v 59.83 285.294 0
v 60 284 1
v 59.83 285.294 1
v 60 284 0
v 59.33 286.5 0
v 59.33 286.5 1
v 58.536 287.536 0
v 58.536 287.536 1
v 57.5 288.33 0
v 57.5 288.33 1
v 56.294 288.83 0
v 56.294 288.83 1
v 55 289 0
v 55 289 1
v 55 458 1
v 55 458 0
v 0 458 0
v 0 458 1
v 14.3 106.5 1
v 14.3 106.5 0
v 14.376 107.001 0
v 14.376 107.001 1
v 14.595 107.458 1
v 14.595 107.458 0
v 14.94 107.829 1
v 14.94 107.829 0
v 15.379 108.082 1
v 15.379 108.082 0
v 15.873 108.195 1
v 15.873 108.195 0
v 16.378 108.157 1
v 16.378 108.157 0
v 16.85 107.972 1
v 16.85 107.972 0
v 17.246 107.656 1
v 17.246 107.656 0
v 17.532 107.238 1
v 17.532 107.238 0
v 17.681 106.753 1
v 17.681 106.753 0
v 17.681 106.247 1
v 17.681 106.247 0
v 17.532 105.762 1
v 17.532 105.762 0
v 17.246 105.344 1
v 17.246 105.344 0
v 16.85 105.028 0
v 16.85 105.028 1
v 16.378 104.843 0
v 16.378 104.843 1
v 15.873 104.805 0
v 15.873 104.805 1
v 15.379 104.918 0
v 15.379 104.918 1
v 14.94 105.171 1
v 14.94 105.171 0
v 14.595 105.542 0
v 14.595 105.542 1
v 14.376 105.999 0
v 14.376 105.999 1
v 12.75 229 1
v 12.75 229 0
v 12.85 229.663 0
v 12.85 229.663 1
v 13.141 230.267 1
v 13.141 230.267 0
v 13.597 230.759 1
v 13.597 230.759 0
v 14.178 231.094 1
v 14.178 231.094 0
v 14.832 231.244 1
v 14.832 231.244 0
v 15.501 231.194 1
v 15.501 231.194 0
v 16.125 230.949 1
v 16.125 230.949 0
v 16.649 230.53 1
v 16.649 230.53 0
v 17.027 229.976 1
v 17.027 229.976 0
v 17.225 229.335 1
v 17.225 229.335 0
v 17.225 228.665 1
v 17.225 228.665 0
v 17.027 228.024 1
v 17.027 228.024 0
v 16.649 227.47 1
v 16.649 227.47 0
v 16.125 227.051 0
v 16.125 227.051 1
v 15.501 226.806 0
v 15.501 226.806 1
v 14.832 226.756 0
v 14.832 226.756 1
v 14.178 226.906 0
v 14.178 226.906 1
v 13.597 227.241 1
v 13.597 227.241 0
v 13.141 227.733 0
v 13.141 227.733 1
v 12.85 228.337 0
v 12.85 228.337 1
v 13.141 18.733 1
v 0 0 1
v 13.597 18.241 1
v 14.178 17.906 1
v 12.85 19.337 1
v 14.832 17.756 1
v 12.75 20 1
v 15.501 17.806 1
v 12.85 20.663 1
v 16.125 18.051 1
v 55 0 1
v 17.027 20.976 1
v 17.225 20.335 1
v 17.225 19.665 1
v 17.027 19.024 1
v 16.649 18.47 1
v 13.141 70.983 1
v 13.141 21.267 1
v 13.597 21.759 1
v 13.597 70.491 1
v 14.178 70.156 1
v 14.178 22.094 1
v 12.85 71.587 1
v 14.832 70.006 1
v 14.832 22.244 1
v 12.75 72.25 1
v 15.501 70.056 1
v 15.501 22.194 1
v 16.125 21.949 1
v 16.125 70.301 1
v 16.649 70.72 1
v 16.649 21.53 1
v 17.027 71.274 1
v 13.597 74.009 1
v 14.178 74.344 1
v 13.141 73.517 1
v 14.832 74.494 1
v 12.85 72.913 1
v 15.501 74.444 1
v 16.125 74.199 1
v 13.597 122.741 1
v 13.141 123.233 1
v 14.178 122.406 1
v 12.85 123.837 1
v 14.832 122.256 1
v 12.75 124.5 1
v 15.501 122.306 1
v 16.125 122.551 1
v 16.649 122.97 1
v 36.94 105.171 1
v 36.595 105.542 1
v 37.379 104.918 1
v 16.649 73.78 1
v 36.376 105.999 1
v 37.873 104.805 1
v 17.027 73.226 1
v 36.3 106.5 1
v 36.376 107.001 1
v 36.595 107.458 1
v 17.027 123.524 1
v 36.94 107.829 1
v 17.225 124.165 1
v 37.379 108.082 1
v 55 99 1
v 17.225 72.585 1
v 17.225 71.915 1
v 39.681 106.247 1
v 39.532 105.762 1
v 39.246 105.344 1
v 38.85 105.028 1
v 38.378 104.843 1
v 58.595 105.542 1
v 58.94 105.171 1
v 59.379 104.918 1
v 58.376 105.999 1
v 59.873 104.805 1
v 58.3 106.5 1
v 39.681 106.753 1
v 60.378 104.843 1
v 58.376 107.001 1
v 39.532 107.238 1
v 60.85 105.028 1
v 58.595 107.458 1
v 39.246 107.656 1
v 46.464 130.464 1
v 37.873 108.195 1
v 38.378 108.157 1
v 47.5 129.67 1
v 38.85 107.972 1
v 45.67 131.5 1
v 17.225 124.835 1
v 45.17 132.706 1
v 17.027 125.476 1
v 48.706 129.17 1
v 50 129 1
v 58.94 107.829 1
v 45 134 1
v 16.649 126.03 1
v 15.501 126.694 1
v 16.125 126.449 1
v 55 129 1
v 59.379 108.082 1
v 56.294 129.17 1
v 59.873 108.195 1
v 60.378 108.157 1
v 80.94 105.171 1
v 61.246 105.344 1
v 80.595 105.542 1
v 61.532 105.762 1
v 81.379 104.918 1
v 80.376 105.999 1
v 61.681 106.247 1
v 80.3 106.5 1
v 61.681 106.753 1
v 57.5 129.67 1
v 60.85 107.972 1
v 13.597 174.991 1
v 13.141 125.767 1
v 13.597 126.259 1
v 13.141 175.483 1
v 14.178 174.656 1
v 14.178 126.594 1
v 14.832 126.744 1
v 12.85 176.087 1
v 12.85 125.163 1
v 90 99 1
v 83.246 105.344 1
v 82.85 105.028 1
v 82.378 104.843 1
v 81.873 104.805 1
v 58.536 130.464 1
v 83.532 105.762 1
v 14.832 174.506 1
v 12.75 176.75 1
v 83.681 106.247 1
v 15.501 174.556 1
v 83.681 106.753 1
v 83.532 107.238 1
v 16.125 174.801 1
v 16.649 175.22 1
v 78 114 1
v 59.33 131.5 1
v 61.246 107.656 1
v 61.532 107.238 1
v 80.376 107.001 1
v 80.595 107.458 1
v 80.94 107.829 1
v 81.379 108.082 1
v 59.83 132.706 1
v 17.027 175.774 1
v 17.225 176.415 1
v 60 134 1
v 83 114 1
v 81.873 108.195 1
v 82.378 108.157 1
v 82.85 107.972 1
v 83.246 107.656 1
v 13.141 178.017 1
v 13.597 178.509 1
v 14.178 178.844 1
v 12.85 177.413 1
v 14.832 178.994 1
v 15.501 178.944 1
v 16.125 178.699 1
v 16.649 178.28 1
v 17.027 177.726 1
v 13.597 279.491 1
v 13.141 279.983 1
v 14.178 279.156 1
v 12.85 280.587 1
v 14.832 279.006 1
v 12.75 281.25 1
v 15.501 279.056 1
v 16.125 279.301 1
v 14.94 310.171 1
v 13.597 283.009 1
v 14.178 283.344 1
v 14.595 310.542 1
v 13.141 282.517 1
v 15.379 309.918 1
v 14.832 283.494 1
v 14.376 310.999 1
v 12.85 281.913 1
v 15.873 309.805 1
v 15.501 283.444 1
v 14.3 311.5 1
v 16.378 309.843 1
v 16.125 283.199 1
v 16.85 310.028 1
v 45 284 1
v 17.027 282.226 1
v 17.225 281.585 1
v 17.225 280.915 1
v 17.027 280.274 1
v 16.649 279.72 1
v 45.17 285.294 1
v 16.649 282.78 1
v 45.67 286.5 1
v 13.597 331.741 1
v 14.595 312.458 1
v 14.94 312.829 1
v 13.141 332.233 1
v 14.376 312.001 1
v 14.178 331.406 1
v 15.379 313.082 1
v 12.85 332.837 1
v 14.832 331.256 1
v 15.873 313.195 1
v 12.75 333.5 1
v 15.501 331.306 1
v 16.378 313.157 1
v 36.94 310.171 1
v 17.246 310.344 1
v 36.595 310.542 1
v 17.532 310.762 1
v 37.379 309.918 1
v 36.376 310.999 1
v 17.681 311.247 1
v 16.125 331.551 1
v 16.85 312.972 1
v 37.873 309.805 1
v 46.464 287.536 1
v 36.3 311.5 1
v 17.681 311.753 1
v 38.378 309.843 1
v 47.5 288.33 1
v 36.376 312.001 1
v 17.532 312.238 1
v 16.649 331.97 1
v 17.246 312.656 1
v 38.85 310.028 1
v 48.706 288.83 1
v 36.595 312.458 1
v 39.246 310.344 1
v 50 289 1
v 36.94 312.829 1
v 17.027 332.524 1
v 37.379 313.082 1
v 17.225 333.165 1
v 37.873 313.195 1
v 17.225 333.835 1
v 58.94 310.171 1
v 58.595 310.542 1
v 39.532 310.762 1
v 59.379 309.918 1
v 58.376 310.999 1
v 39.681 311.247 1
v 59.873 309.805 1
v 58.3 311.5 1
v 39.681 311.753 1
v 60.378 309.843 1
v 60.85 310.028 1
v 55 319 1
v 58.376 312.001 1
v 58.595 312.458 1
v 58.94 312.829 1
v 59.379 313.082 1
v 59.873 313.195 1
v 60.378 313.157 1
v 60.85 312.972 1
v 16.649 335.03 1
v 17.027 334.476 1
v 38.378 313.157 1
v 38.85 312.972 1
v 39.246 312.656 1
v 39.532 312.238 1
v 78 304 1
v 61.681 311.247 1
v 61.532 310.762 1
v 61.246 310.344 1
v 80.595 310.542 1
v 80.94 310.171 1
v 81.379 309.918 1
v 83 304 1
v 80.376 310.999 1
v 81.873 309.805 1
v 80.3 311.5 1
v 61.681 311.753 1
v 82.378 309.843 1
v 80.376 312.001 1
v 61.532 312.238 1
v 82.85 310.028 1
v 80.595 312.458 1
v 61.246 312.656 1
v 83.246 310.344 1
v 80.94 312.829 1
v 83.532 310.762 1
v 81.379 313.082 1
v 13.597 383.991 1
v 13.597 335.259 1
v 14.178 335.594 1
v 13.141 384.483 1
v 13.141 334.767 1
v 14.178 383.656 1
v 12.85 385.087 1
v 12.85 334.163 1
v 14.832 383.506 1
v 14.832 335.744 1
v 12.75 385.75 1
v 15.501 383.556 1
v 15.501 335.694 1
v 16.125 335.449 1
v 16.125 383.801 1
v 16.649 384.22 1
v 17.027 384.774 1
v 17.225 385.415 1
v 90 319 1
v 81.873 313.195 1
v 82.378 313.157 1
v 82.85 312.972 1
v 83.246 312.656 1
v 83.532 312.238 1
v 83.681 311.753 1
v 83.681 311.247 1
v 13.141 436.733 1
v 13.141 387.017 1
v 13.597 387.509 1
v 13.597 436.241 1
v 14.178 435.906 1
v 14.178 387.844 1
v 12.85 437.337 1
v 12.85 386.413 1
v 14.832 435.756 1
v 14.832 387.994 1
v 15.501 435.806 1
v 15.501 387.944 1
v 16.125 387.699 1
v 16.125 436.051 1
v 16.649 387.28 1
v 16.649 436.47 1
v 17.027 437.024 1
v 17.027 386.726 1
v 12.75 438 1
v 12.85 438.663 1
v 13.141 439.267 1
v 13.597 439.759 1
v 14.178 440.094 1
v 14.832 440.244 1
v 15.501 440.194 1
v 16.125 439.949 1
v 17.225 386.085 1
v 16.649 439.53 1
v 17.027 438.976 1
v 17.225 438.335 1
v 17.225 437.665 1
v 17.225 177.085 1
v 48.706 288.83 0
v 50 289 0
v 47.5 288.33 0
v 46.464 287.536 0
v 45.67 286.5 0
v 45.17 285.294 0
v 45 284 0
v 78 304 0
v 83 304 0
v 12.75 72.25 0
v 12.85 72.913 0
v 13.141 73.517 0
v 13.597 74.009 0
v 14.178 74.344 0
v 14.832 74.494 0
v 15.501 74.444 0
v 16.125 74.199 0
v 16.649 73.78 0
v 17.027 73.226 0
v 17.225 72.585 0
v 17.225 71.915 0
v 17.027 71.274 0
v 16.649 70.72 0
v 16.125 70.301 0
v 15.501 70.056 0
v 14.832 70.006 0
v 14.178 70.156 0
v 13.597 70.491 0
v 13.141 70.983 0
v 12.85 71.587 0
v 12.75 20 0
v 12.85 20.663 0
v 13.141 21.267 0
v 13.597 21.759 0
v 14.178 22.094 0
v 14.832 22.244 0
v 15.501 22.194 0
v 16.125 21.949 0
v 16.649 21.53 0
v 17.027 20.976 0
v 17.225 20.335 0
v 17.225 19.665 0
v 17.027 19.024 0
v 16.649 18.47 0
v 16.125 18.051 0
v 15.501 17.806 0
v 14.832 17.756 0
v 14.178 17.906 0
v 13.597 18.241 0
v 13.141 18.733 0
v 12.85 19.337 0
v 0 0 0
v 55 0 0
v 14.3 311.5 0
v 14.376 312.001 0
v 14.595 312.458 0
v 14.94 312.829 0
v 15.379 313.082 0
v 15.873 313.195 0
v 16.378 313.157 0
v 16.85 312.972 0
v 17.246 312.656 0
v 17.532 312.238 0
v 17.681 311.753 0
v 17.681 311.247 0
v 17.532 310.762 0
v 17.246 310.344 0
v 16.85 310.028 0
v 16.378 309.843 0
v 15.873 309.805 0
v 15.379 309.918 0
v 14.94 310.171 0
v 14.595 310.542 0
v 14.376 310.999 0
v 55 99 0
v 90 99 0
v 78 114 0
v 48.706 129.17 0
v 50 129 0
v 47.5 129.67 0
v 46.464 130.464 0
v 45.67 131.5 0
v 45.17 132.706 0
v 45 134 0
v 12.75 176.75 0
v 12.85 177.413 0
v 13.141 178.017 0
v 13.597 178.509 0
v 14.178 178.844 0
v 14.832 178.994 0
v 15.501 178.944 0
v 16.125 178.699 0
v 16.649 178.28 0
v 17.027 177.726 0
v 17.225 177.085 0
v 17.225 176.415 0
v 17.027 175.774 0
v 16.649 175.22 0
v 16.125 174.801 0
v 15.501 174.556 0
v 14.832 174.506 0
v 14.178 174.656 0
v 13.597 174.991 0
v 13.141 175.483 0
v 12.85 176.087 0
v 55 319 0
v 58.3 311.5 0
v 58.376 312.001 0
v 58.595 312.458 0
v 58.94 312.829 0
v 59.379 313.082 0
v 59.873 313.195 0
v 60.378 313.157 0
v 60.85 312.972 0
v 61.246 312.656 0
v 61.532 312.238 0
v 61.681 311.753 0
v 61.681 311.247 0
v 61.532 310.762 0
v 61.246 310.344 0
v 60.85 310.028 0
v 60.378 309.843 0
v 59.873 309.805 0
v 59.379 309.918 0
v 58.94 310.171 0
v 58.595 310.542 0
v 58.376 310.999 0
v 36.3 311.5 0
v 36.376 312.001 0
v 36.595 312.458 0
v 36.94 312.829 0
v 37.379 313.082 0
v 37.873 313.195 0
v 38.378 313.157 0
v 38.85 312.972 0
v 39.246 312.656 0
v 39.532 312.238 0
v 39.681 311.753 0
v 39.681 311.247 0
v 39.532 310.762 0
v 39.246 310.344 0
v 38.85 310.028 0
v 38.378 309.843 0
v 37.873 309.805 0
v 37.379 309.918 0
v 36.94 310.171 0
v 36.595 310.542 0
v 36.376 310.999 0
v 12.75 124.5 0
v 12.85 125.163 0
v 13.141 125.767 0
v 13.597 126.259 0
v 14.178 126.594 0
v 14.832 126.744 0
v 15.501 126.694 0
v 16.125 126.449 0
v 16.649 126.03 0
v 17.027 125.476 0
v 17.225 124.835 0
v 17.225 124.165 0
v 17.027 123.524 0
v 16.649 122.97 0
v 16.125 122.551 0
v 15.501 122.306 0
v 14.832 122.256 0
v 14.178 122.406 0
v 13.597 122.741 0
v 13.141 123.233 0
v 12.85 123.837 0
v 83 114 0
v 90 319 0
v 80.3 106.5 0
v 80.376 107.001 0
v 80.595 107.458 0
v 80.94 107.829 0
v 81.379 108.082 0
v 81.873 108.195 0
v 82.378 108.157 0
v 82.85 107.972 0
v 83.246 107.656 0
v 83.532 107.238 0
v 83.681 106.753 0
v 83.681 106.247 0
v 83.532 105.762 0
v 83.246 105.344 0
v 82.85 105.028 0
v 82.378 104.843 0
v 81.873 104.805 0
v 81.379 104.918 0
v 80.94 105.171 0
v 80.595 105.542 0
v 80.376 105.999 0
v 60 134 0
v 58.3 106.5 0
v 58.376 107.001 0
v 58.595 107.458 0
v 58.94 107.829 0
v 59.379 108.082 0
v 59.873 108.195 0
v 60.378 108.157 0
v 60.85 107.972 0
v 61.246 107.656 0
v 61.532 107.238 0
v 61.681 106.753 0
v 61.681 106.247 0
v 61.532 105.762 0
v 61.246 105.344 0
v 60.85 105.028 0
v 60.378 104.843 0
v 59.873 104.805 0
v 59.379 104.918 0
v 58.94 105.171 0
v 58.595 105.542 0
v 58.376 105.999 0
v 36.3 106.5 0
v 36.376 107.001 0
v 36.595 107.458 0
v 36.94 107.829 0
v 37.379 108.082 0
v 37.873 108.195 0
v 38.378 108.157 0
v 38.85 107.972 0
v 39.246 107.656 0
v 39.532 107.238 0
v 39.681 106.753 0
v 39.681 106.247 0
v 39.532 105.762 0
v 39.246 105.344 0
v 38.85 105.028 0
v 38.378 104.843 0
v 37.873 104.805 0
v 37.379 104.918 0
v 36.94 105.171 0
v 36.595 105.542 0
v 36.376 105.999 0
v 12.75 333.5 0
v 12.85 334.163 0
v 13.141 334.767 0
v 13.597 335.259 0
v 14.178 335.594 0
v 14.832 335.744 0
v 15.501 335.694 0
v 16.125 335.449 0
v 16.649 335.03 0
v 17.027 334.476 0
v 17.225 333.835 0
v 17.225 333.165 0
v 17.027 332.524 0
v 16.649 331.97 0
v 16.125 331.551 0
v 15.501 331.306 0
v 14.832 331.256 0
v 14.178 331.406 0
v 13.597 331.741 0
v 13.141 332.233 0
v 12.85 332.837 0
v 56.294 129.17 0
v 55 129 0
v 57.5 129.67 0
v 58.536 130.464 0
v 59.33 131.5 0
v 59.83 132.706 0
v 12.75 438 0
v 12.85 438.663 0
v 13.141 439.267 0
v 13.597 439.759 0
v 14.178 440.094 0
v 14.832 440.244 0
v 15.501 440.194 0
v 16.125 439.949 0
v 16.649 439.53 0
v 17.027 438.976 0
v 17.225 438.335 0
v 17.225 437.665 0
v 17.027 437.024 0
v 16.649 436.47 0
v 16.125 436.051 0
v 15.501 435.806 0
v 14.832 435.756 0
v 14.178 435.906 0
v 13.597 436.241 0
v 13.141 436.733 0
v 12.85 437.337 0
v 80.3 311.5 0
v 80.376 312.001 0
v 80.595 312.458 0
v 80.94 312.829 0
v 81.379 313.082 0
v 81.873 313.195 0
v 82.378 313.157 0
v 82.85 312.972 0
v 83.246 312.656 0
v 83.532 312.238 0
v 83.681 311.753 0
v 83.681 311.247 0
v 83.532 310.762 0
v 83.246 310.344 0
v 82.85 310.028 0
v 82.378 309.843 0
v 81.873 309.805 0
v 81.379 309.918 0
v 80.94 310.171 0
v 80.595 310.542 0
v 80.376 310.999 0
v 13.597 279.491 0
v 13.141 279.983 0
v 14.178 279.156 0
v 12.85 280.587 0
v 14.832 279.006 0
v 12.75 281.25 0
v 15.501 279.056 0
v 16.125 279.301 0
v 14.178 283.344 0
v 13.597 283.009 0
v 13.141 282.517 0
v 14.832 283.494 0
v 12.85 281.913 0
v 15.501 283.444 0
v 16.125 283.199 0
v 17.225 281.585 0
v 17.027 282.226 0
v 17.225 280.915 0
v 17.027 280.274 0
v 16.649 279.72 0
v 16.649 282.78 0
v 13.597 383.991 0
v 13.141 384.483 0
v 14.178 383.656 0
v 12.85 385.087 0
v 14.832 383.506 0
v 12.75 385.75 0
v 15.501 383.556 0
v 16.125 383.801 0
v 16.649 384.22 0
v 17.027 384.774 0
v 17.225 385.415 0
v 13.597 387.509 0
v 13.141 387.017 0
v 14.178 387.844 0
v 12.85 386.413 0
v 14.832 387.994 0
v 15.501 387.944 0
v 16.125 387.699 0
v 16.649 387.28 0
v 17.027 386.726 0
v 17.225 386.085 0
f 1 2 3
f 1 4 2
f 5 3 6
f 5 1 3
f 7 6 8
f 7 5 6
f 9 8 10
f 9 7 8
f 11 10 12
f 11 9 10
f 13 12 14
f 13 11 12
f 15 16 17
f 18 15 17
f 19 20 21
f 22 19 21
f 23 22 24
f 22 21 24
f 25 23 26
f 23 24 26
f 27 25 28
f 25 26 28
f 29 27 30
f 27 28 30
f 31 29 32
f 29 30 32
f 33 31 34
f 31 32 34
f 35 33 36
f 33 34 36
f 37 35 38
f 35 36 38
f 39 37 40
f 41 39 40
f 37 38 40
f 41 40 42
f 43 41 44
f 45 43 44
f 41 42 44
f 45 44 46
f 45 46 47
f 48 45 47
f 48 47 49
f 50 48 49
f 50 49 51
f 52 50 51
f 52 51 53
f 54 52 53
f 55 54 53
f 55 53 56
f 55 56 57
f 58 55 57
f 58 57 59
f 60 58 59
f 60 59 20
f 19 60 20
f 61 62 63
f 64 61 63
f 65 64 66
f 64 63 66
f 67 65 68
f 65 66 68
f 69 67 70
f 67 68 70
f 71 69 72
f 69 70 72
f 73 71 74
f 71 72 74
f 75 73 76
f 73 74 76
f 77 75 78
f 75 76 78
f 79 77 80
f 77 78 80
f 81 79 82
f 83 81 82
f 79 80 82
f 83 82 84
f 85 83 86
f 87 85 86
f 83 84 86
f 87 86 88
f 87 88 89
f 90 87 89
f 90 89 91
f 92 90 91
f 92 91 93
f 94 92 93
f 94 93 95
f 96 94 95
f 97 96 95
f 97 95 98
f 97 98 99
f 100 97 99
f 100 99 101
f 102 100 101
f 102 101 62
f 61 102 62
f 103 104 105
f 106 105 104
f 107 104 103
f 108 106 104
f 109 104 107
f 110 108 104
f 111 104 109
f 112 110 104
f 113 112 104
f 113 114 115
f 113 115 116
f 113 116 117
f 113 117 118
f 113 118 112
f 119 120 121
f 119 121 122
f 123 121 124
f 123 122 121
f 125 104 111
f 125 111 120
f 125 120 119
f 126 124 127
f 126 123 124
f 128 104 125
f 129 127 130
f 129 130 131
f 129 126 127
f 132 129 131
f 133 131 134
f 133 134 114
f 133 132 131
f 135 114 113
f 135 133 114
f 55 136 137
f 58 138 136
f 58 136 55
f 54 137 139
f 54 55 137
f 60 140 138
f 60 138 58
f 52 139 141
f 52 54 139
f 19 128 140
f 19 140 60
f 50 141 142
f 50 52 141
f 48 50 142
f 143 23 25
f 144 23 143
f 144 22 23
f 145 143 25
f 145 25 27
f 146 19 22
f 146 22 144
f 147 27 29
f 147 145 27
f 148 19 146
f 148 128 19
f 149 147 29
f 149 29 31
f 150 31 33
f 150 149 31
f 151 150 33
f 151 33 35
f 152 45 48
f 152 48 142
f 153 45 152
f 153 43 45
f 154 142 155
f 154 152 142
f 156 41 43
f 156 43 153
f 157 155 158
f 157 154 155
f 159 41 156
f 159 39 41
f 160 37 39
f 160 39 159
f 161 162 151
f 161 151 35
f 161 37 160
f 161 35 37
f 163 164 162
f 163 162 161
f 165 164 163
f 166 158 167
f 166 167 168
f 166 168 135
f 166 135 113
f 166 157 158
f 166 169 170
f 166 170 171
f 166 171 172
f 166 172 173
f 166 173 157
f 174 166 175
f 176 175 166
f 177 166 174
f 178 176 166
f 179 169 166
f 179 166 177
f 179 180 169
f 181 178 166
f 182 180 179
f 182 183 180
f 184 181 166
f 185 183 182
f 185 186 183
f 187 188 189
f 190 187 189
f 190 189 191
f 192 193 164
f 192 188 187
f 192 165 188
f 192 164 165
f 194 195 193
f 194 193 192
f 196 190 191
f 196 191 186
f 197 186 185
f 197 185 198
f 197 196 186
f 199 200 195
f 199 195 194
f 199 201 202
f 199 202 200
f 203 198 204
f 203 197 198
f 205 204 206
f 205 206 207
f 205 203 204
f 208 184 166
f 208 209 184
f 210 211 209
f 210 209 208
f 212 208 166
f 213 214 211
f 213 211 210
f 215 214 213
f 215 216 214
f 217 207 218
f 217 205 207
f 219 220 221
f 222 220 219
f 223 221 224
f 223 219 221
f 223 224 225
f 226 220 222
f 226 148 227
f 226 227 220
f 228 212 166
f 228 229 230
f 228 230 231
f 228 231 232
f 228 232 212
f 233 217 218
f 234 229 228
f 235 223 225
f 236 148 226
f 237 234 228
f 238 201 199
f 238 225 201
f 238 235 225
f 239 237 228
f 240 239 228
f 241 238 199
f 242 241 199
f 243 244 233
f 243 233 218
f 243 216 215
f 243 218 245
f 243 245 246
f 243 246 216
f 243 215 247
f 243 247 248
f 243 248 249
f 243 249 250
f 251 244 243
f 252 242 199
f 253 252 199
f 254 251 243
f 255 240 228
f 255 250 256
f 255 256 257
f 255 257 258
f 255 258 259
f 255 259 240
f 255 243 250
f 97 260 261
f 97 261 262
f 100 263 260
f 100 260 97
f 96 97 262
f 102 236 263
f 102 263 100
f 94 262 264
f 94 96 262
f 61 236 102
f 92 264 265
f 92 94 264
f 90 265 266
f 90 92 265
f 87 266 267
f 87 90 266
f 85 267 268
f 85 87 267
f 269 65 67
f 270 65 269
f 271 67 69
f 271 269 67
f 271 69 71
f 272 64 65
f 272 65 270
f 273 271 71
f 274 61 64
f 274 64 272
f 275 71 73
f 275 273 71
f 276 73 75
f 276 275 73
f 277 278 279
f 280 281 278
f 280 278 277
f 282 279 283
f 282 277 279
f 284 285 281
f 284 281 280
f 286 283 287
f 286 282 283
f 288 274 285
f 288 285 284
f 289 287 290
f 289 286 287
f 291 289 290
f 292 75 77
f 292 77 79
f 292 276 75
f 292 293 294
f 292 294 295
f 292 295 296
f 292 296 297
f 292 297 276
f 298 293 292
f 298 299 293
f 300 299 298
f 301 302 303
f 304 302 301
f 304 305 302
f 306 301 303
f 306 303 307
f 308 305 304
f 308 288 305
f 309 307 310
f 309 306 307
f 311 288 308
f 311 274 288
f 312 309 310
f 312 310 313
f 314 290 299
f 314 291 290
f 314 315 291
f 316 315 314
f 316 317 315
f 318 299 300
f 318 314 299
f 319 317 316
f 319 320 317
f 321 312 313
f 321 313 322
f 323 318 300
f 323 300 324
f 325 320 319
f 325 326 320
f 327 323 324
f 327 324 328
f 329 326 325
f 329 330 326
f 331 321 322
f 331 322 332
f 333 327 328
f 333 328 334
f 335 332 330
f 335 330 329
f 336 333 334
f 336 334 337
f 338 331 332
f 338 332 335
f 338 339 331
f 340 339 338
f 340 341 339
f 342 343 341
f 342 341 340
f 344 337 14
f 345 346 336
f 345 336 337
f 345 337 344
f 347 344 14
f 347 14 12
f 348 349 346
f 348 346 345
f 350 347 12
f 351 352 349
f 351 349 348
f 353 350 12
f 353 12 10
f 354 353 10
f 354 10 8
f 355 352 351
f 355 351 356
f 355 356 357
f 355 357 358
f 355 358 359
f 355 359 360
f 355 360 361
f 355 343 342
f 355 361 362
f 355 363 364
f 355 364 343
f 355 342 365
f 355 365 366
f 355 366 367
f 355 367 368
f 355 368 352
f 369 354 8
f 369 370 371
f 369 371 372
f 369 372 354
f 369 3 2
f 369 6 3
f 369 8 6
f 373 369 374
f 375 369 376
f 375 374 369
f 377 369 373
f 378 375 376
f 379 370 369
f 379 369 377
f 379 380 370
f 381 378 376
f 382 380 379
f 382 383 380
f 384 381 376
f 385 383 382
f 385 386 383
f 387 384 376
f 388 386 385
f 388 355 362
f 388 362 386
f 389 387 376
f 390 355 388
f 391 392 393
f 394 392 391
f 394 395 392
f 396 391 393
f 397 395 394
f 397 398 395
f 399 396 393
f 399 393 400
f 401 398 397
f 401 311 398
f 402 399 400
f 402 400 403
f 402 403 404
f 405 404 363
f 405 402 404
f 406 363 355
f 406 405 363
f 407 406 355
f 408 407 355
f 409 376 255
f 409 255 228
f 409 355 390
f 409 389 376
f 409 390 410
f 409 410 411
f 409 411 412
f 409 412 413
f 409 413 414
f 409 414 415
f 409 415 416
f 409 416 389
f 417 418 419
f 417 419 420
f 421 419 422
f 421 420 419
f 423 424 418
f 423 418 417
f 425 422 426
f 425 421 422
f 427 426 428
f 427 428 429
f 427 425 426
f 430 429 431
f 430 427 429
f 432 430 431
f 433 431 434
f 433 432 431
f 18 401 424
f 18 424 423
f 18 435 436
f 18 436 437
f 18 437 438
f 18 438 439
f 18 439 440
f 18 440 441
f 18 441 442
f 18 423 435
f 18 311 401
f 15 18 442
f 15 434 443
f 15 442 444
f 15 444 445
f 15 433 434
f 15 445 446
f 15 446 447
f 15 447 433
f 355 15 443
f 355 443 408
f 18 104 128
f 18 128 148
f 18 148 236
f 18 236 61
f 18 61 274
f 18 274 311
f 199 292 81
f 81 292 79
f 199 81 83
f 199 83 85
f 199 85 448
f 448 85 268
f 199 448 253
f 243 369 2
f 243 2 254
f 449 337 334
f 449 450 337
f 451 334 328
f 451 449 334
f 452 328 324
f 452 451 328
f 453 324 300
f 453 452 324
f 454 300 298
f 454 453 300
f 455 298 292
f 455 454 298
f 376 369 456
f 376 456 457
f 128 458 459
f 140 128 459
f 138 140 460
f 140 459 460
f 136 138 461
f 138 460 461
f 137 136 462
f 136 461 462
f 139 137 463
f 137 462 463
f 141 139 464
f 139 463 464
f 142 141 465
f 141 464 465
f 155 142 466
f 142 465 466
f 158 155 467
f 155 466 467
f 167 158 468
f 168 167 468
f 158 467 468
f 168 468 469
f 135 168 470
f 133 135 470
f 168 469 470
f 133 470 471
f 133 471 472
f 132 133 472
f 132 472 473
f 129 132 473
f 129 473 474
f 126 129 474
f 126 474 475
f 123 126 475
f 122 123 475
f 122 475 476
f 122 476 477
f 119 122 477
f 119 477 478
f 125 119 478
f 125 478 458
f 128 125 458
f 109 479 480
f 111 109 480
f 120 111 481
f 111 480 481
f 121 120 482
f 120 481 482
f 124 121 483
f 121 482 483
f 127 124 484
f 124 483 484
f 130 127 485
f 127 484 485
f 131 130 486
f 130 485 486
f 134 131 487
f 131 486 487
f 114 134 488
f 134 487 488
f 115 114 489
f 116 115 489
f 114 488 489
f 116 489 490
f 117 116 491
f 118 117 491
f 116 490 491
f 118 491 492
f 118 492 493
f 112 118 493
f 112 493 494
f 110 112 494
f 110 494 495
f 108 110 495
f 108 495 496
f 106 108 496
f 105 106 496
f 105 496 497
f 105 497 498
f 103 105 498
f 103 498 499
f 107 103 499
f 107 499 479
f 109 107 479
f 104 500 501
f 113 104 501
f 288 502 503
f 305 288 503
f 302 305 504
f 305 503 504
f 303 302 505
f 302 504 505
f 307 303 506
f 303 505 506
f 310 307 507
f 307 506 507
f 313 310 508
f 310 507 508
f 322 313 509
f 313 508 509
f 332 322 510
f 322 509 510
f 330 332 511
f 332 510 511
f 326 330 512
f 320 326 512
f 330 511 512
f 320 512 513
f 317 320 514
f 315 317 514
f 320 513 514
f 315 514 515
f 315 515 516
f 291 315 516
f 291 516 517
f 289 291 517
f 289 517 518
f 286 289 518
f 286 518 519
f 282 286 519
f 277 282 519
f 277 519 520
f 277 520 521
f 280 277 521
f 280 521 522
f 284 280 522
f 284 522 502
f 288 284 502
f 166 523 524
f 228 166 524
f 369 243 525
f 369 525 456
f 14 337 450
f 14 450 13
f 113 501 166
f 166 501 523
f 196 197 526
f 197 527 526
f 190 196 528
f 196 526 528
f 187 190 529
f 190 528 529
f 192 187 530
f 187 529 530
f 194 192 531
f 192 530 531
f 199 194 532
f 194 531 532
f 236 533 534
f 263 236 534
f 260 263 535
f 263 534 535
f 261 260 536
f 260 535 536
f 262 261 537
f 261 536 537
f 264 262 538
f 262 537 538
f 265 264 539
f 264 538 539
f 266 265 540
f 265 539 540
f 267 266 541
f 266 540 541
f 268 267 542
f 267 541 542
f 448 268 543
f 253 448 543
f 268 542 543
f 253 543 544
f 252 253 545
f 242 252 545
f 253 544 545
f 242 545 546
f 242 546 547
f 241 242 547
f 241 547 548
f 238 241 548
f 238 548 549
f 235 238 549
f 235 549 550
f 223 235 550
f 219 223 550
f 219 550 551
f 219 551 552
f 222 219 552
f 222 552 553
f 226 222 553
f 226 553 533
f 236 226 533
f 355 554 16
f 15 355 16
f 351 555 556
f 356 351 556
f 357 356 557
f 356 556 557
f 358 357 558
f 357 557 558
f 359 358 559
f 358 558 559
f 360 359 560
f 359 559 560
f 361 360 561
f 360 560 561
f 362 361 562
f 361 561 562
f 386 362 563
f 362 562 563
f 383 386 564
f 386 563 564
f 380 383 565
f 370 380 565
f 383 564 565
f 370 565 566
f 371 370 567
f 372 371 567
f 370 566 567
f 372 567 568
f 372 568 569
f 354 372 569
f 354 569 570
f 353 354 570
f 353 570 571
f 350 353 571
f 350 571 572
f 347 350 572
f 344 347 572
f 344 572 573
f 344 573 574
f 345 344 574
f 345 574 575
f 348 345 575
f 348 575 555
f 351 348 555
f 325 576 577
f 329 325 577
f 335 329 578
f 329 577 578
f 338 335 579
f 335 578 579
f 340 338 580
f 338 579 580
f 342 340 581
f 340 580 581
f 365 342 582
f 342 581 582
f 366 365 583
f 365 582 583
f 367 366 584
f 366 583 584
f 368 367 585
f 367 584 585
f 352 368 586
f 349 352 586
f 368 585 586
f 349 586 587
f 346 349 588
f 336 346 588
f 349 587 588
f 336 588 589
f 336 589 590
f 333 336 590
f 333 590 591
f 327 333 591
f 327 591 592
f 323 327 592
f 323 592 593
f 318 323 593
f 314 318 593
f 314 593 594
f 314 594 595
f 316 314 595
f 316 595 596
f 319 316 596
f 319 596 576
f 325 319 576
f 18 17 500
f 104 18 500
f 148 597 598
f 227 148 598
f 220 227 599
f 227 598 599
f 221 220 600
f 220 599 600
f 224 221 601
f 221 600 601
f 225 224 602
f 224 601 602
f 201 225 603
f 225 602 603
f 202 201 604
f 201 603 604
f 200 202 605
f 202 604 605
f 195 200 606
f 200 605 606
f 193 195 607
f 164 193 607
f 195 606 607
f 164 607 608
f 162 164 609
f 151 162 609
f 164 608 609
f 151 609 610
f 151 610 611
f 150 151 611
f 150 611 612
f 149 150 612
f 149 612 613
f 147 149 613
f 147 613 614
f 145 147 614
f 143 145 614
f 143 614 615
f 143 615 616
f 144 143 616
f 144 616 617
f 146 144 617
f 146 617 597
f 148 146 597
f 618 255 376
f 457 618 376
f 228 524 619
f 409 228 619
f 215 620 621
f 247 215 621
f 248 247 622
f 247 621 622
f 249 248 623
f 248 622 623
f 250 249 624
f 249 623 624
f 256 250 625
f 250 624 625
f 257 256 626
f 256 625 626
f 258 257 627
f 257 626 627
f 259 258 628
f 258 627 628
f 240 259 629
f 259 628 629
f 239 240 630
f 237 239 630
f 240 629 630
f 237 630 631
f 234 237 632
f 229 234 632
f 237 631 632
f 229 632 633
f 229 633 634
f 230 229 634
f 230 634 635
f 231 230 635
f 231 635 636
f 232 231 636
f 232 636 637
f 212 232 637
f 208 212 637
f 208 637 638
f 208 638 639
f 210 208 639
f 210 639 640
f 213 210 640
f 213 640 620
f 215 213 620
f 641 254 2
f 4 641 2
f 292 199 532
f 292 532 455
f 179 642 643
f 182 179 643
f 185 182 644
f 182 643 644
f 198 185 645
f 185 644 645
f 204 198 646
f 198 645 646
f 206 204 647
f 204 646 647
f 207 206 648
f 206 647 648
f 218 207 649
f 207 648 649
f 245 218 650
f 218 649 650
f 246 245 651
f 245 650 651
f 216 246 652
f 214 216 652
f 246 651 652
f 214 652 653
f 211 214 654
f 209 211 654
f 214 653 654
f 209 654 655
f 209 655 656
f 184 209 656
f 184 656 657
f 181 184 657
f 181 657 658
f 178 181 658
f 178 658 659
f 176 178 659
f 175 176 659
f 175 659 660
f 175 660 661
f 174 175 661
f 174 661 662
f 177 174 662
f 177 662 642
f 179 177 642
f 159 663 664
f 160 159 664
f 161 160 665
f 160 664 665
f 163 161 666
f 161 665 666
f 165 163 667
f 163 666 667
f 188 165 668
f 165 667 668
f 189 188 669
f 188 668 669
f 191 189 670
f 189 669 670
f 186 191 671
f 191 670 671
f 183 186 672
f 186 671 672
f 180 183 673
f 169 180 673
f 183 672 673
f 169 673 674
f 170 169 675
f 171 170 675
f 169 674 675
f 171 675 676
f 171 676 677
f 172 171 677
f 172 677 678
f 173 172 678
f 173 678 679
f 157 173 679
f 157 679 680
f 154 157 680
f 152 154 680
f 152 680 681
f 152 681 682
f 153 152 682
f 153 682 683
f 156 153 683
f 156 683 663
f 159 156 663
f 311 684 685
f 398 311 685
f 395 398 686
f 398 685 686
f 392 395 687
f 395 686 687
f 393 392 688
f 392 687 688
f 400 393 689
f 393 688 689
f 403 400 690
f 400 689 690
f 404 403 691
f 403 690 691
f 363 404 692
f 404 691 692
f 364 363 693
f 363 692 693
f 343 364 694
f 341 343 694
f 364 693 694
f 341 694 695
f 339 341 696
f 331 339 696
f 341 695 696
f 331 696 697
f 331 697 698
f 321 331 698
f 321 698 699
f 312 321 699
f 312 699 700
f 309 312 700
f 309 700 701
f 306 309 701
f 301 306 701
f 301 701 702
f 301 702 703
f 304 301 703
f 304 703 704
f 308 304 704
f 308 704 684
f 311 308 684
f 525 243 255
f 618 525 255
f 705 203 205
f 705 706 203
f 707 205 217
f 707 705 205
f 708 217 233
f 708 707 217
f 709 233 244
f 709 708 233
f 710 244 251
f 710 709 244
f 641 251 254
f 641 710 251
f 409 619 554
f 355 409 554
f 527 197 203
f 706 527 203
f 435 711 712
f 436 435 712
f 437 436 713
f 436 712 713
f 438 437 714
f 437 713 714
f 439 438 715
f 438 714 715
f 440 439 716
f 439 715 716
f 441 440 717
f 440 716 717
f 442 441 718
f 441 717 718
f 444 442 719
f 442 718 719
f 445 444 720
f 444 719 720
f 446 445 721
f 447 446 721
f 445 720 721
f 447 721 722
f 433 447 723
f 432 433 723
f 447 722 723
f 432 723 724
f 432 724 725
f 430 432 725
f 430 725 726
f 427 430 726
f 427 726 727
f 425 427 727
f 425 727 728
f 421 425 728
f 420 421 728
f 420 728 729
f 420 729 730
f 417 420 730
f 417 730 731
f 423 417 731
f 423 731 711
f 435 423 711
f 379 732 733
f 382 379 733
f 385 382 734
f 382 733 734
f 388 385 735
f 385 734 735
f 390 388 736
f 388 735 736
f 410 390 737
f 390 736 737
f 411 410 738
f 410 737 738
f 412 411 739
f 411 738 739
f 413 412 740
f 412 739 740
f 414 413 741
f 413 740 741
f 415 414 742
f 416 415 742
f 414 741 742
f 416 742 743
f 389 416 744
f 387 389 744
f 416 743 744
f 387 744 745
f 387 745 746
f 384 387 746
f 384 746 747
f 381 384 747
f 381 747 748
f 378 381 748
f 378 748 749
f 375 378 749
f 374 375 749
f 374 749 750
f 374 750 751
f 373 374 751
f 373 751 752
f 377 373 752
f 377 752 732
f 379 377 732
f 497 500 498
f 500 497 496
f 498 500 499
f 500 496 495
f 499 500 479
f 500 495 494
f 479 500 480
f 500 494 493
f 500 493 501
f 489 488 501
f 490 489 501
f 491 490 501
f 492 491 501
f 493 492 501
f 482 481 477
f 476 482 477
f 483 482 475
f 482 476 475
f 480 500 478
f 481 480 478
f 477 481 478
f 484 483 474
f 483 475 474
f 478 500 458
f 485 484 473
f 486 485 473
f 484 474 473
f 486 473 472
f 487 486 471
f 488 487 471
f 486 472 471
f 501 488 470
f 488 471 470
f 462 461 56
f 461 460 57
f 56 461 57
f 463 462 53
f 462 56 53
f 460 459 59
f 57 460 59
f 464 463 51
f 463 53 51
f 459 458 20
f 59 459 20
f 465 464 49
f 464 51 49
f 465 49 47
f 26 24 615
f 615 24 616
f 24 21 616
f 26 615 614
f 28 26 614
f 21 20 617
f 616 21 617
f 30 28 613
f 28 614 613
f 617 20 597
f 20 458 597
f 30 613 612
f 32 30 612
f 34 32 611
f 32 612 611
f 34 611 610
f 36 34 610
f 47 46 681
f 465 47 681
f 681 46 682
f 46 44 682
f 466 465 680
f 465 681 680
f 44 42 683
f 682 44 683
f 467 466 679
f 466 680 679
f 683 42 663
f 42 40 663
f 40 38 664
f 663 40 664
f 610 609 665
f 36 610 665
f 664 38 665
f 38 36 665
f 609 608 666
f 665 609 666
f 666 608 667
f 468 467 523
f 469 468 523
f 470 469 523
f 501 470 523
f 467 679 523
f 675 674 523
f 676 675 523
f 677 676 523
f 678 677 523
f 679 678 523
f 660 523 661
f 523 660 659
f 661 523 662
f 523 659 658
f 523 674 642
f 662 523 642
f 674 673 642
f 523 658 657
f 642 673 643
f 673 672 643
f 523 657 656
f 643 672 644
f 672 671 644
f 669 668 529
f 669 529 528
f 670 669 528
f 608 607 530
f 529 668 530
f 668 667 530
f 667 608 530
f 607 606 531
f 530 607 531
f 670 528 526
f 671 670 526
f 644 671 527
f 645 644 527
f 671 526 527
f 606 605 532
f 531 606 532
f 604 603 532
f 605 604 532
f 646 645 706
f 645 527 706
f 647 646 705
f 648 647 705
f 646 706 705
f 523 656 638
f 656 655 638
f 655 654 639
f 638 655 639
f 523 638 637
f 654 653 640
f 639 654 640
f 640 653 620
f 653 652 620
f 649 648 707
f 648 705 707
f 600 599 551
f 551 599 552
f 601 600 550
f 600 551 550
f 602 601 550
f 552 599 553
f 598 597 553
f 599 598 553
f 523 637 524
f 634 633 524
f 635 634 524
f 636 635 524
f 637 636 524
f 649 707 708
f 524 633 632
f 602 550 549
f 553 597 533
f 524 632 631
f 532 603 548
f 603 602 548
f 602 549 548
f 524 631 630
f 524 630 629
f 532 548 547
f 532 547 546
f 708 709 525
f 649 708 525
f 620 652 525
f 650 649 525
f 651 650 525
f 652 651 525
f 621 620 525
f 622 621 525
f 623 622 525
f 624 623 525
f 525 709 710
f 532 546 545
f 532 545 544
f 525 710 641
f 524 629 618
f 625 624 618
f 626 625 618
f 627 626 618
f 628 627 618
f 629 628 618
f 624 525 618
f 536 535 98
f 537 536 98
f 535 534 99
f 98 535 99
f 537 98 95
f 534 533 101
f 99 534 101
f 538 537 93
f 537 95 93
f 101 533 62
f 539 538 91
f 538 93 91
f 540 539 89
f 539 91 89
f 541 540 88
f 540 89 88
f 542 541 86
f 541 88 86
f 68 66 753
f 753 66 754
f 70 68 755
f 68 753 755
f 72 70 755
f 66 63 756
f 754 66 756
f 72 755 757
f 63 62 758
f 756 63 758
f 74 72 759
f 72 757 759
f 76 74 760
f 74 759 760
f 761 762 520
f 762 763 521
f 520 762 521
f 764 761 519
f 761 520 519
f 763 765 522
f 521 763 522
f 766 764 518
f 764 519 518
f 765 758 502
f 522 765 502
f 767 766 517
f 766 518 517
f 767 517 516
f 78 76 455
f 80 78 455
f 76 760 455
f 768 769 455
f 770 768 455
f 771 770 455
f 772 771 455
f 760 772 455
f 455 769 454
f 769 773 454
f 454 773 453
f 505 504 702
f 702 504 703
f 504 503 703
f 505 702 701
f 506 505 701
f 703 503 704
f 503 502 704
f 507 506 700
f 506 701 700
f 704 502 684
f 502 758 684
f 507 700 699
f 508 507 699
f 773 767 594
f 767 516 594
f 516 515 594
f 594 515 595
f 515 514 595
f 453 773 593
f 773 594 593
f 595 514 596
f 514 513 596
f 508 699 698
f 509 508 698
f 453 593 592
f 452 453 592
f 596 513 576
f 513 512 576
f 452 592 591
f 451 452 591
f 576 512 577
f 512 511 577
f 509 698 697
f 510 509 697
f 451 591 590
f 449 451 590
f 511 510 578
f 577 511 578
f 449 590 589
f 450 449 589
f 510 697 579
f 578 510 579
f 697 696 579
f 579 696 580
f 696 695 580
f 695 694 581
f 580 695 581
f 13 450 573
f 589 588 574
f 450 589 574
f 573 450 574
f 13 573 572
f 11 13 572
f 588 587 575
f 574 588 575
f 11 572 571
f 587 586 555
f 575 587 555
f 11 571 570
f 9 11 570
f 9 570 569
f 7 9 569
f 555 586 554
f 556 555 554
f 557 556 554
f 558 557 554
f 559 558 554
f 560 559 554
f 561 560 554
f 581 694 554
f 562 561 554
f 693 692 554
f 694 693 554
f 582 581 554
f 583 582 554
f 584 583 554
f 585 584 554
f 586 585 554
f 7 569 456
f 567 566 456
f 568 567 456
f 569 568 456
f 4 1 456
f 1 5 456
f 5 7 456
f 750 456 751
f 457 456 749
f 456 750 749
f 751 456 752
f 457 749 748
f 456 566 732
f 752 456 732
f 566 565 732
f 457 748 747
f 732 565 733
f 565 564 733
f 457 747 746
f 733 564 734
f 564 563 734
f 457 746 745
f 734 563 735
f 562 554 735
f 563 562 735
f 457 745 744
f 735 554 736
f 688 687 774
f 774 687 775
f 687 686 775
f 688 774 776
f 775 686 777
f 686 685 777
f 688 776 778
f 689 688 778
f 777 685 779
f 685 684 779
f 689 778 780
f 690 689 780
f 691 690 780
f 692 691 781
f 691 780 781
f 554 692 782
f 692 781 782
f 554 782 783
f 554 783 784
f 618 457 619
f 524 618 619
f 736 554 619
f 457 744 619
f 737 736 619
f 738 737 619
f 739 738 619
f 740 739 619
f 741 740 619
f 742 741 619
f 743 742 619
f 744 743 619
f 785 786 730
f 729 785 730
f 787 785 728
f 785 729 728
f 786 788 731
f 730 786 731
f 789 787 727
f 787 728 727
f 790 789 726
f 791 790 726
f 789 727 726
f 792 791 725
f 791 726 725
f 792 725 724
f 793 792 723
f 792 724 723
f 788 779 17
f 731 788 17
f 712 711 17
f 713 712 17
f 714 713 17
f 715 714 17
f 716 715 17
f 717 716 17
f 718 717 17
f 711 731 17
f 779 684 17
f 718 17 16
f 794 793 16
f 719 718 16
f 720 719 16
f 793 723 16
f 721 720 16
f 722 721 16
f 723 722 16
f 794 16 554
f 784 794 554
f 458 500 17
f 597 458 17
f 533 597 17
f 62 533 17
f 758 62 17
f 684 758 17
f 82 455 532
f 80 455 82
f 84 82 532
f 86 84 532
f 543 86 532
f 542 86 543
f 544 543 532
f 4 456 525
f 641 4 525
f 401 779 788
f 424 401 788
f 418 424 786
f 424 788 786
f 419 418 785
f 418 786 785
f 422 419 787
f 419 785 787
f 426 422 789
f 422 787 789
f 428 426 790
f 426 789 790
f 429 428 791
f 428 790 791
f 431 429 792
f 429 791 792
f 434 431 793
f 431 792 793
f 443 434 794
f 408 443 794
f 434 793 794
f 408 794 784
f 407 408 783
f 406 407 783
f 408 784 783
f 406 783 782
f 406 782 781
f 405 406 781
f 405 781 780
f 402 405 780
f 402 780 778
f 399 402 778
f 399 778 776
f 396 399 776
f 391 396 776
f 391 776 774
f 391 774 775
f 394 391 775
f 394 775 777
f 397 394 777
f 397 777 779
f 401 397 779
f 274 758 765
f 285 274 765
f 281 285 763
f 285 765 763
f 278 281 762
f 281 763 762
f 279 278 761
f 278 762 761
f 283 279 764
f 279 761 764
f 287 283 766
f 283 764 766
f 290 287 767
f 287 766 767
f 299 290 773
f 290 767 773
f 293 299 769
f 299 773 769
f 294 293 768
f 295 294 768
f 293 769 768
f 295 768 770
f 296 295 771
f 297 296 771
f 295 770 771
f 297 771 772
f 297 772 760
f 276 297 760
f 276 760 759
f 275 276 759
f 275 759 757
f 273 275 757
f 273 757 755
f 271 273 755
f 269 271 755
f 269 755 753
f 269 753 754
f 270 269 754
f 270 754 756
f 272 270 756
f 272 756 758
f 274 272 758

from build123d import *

# Parameters (mm, degrees)
EXTRUDE_1_DEPTH       = 1
HOLE_WIZARD_M41_D     = 4.5
HOLE_WIZARD_M41_DEPTH = 5
HOLE_WIZARD_M41_TIP   = 1.351936393
SKETCH_4_W            = 5
SKETCH_4_H            = 190
SKETCH_4_W_2          = 15
SKETCH_4_H_2          = 160
CUT_EXTRUDE_1_DEPTH   = 467.760109692
FILLET_1_R            = 5
HOLE_WIZARD_M31_D     = 3.4
HOLE_WIZARD_M31_DEPTH = 5
HOLE_WIZARD_M31_TIP   = 1.021463052


with BuildPart() as part:
    # Эскиз1 → Бобышка-Вытянуть1 (new body)
    with BuildSketch(Plane.XY):
        Polygon((55, 319), (55, 458), (0, 458), (0, 0), (55, 0), (55, 99), (90, 99), (90, 319), align=None)
    extrude(amount=EXTRUDE_1_DEPTH)

    # Отверстие с зазором M41
    with Locations(Plane.XY.offset(1)):
        with Locations((15, 20), (15, 72.25), (15, 124.5), (15, 176.75), (15, 229), (15, 281.25), (15, 333.5), (15, 385.75), (15, 438)):
            Hole(HOLE_WIZARD_M41_D / 2, depth=HOLE_WIZARD_M41_DEPTH)
            with Locations((0, 0, -(HOLE_WIZARD_M41_DEPTH + HOLE_WIZARD_M41_TIP / 2))):  # 118° drill point
                Cone(0, HOLE_WIZARD_M41_D / 2, HOLE_WIZARD_M41_TIP, mode=Mode.SUBTRACT)

    # Эскиз4 → Вырез-Вытянуть1 (cut, through all)
    with BuildSketch(Plane.XY.offset(1)):
        with Locations((80.5, 209)):
            Rectangle(SKETCH_4_W, SKETCH_4_H)
        with Locations((52.5, 209)):
            Rectangle(SKETCH_4_W_2, SKETCH_4_H_2)
    extrude(amount=-CUT_EXTRUDE_1_DEPTH, mode=Mode.SUBTRACT)

    # Скругление1
    fillet_1_edges = [part.edges().sort_by_distance(p)[0] for p in [
        (60, 289, 0.5),
        (60, 129, 0.5),
        (45, 129, 0.5),
        (45, 289, 0.5),
    ]]
    fillet(fillet_1_edges, radius=FILLET_1_R)

    # Отверстие с зазором M31
    with Locations(Plane.XY.offset(1)):
        with Locations((82, 106.5), (82, 311.5), (60, 106.5), (60, 311.5), (38, 106.5), (38, 311.5), (16, 106.5), (16, 311.5)):
            Hole(HOLE_WIZARD_M31_D / 2, depth=HOLE_WIZARD_M31_DEPTH)
            with Locations((0, 0, -(HOLE_WIZARD_M31_DEPTH + HOLE_WIZARD_M31_TIP / 2))):  # 118° drill point
                Cone(0, HOLE_WIZARD_M31_D / 2, HOLE_WIZARD_M31_TIP, mode=Mode.SUBTRACT)


solid = part.part
